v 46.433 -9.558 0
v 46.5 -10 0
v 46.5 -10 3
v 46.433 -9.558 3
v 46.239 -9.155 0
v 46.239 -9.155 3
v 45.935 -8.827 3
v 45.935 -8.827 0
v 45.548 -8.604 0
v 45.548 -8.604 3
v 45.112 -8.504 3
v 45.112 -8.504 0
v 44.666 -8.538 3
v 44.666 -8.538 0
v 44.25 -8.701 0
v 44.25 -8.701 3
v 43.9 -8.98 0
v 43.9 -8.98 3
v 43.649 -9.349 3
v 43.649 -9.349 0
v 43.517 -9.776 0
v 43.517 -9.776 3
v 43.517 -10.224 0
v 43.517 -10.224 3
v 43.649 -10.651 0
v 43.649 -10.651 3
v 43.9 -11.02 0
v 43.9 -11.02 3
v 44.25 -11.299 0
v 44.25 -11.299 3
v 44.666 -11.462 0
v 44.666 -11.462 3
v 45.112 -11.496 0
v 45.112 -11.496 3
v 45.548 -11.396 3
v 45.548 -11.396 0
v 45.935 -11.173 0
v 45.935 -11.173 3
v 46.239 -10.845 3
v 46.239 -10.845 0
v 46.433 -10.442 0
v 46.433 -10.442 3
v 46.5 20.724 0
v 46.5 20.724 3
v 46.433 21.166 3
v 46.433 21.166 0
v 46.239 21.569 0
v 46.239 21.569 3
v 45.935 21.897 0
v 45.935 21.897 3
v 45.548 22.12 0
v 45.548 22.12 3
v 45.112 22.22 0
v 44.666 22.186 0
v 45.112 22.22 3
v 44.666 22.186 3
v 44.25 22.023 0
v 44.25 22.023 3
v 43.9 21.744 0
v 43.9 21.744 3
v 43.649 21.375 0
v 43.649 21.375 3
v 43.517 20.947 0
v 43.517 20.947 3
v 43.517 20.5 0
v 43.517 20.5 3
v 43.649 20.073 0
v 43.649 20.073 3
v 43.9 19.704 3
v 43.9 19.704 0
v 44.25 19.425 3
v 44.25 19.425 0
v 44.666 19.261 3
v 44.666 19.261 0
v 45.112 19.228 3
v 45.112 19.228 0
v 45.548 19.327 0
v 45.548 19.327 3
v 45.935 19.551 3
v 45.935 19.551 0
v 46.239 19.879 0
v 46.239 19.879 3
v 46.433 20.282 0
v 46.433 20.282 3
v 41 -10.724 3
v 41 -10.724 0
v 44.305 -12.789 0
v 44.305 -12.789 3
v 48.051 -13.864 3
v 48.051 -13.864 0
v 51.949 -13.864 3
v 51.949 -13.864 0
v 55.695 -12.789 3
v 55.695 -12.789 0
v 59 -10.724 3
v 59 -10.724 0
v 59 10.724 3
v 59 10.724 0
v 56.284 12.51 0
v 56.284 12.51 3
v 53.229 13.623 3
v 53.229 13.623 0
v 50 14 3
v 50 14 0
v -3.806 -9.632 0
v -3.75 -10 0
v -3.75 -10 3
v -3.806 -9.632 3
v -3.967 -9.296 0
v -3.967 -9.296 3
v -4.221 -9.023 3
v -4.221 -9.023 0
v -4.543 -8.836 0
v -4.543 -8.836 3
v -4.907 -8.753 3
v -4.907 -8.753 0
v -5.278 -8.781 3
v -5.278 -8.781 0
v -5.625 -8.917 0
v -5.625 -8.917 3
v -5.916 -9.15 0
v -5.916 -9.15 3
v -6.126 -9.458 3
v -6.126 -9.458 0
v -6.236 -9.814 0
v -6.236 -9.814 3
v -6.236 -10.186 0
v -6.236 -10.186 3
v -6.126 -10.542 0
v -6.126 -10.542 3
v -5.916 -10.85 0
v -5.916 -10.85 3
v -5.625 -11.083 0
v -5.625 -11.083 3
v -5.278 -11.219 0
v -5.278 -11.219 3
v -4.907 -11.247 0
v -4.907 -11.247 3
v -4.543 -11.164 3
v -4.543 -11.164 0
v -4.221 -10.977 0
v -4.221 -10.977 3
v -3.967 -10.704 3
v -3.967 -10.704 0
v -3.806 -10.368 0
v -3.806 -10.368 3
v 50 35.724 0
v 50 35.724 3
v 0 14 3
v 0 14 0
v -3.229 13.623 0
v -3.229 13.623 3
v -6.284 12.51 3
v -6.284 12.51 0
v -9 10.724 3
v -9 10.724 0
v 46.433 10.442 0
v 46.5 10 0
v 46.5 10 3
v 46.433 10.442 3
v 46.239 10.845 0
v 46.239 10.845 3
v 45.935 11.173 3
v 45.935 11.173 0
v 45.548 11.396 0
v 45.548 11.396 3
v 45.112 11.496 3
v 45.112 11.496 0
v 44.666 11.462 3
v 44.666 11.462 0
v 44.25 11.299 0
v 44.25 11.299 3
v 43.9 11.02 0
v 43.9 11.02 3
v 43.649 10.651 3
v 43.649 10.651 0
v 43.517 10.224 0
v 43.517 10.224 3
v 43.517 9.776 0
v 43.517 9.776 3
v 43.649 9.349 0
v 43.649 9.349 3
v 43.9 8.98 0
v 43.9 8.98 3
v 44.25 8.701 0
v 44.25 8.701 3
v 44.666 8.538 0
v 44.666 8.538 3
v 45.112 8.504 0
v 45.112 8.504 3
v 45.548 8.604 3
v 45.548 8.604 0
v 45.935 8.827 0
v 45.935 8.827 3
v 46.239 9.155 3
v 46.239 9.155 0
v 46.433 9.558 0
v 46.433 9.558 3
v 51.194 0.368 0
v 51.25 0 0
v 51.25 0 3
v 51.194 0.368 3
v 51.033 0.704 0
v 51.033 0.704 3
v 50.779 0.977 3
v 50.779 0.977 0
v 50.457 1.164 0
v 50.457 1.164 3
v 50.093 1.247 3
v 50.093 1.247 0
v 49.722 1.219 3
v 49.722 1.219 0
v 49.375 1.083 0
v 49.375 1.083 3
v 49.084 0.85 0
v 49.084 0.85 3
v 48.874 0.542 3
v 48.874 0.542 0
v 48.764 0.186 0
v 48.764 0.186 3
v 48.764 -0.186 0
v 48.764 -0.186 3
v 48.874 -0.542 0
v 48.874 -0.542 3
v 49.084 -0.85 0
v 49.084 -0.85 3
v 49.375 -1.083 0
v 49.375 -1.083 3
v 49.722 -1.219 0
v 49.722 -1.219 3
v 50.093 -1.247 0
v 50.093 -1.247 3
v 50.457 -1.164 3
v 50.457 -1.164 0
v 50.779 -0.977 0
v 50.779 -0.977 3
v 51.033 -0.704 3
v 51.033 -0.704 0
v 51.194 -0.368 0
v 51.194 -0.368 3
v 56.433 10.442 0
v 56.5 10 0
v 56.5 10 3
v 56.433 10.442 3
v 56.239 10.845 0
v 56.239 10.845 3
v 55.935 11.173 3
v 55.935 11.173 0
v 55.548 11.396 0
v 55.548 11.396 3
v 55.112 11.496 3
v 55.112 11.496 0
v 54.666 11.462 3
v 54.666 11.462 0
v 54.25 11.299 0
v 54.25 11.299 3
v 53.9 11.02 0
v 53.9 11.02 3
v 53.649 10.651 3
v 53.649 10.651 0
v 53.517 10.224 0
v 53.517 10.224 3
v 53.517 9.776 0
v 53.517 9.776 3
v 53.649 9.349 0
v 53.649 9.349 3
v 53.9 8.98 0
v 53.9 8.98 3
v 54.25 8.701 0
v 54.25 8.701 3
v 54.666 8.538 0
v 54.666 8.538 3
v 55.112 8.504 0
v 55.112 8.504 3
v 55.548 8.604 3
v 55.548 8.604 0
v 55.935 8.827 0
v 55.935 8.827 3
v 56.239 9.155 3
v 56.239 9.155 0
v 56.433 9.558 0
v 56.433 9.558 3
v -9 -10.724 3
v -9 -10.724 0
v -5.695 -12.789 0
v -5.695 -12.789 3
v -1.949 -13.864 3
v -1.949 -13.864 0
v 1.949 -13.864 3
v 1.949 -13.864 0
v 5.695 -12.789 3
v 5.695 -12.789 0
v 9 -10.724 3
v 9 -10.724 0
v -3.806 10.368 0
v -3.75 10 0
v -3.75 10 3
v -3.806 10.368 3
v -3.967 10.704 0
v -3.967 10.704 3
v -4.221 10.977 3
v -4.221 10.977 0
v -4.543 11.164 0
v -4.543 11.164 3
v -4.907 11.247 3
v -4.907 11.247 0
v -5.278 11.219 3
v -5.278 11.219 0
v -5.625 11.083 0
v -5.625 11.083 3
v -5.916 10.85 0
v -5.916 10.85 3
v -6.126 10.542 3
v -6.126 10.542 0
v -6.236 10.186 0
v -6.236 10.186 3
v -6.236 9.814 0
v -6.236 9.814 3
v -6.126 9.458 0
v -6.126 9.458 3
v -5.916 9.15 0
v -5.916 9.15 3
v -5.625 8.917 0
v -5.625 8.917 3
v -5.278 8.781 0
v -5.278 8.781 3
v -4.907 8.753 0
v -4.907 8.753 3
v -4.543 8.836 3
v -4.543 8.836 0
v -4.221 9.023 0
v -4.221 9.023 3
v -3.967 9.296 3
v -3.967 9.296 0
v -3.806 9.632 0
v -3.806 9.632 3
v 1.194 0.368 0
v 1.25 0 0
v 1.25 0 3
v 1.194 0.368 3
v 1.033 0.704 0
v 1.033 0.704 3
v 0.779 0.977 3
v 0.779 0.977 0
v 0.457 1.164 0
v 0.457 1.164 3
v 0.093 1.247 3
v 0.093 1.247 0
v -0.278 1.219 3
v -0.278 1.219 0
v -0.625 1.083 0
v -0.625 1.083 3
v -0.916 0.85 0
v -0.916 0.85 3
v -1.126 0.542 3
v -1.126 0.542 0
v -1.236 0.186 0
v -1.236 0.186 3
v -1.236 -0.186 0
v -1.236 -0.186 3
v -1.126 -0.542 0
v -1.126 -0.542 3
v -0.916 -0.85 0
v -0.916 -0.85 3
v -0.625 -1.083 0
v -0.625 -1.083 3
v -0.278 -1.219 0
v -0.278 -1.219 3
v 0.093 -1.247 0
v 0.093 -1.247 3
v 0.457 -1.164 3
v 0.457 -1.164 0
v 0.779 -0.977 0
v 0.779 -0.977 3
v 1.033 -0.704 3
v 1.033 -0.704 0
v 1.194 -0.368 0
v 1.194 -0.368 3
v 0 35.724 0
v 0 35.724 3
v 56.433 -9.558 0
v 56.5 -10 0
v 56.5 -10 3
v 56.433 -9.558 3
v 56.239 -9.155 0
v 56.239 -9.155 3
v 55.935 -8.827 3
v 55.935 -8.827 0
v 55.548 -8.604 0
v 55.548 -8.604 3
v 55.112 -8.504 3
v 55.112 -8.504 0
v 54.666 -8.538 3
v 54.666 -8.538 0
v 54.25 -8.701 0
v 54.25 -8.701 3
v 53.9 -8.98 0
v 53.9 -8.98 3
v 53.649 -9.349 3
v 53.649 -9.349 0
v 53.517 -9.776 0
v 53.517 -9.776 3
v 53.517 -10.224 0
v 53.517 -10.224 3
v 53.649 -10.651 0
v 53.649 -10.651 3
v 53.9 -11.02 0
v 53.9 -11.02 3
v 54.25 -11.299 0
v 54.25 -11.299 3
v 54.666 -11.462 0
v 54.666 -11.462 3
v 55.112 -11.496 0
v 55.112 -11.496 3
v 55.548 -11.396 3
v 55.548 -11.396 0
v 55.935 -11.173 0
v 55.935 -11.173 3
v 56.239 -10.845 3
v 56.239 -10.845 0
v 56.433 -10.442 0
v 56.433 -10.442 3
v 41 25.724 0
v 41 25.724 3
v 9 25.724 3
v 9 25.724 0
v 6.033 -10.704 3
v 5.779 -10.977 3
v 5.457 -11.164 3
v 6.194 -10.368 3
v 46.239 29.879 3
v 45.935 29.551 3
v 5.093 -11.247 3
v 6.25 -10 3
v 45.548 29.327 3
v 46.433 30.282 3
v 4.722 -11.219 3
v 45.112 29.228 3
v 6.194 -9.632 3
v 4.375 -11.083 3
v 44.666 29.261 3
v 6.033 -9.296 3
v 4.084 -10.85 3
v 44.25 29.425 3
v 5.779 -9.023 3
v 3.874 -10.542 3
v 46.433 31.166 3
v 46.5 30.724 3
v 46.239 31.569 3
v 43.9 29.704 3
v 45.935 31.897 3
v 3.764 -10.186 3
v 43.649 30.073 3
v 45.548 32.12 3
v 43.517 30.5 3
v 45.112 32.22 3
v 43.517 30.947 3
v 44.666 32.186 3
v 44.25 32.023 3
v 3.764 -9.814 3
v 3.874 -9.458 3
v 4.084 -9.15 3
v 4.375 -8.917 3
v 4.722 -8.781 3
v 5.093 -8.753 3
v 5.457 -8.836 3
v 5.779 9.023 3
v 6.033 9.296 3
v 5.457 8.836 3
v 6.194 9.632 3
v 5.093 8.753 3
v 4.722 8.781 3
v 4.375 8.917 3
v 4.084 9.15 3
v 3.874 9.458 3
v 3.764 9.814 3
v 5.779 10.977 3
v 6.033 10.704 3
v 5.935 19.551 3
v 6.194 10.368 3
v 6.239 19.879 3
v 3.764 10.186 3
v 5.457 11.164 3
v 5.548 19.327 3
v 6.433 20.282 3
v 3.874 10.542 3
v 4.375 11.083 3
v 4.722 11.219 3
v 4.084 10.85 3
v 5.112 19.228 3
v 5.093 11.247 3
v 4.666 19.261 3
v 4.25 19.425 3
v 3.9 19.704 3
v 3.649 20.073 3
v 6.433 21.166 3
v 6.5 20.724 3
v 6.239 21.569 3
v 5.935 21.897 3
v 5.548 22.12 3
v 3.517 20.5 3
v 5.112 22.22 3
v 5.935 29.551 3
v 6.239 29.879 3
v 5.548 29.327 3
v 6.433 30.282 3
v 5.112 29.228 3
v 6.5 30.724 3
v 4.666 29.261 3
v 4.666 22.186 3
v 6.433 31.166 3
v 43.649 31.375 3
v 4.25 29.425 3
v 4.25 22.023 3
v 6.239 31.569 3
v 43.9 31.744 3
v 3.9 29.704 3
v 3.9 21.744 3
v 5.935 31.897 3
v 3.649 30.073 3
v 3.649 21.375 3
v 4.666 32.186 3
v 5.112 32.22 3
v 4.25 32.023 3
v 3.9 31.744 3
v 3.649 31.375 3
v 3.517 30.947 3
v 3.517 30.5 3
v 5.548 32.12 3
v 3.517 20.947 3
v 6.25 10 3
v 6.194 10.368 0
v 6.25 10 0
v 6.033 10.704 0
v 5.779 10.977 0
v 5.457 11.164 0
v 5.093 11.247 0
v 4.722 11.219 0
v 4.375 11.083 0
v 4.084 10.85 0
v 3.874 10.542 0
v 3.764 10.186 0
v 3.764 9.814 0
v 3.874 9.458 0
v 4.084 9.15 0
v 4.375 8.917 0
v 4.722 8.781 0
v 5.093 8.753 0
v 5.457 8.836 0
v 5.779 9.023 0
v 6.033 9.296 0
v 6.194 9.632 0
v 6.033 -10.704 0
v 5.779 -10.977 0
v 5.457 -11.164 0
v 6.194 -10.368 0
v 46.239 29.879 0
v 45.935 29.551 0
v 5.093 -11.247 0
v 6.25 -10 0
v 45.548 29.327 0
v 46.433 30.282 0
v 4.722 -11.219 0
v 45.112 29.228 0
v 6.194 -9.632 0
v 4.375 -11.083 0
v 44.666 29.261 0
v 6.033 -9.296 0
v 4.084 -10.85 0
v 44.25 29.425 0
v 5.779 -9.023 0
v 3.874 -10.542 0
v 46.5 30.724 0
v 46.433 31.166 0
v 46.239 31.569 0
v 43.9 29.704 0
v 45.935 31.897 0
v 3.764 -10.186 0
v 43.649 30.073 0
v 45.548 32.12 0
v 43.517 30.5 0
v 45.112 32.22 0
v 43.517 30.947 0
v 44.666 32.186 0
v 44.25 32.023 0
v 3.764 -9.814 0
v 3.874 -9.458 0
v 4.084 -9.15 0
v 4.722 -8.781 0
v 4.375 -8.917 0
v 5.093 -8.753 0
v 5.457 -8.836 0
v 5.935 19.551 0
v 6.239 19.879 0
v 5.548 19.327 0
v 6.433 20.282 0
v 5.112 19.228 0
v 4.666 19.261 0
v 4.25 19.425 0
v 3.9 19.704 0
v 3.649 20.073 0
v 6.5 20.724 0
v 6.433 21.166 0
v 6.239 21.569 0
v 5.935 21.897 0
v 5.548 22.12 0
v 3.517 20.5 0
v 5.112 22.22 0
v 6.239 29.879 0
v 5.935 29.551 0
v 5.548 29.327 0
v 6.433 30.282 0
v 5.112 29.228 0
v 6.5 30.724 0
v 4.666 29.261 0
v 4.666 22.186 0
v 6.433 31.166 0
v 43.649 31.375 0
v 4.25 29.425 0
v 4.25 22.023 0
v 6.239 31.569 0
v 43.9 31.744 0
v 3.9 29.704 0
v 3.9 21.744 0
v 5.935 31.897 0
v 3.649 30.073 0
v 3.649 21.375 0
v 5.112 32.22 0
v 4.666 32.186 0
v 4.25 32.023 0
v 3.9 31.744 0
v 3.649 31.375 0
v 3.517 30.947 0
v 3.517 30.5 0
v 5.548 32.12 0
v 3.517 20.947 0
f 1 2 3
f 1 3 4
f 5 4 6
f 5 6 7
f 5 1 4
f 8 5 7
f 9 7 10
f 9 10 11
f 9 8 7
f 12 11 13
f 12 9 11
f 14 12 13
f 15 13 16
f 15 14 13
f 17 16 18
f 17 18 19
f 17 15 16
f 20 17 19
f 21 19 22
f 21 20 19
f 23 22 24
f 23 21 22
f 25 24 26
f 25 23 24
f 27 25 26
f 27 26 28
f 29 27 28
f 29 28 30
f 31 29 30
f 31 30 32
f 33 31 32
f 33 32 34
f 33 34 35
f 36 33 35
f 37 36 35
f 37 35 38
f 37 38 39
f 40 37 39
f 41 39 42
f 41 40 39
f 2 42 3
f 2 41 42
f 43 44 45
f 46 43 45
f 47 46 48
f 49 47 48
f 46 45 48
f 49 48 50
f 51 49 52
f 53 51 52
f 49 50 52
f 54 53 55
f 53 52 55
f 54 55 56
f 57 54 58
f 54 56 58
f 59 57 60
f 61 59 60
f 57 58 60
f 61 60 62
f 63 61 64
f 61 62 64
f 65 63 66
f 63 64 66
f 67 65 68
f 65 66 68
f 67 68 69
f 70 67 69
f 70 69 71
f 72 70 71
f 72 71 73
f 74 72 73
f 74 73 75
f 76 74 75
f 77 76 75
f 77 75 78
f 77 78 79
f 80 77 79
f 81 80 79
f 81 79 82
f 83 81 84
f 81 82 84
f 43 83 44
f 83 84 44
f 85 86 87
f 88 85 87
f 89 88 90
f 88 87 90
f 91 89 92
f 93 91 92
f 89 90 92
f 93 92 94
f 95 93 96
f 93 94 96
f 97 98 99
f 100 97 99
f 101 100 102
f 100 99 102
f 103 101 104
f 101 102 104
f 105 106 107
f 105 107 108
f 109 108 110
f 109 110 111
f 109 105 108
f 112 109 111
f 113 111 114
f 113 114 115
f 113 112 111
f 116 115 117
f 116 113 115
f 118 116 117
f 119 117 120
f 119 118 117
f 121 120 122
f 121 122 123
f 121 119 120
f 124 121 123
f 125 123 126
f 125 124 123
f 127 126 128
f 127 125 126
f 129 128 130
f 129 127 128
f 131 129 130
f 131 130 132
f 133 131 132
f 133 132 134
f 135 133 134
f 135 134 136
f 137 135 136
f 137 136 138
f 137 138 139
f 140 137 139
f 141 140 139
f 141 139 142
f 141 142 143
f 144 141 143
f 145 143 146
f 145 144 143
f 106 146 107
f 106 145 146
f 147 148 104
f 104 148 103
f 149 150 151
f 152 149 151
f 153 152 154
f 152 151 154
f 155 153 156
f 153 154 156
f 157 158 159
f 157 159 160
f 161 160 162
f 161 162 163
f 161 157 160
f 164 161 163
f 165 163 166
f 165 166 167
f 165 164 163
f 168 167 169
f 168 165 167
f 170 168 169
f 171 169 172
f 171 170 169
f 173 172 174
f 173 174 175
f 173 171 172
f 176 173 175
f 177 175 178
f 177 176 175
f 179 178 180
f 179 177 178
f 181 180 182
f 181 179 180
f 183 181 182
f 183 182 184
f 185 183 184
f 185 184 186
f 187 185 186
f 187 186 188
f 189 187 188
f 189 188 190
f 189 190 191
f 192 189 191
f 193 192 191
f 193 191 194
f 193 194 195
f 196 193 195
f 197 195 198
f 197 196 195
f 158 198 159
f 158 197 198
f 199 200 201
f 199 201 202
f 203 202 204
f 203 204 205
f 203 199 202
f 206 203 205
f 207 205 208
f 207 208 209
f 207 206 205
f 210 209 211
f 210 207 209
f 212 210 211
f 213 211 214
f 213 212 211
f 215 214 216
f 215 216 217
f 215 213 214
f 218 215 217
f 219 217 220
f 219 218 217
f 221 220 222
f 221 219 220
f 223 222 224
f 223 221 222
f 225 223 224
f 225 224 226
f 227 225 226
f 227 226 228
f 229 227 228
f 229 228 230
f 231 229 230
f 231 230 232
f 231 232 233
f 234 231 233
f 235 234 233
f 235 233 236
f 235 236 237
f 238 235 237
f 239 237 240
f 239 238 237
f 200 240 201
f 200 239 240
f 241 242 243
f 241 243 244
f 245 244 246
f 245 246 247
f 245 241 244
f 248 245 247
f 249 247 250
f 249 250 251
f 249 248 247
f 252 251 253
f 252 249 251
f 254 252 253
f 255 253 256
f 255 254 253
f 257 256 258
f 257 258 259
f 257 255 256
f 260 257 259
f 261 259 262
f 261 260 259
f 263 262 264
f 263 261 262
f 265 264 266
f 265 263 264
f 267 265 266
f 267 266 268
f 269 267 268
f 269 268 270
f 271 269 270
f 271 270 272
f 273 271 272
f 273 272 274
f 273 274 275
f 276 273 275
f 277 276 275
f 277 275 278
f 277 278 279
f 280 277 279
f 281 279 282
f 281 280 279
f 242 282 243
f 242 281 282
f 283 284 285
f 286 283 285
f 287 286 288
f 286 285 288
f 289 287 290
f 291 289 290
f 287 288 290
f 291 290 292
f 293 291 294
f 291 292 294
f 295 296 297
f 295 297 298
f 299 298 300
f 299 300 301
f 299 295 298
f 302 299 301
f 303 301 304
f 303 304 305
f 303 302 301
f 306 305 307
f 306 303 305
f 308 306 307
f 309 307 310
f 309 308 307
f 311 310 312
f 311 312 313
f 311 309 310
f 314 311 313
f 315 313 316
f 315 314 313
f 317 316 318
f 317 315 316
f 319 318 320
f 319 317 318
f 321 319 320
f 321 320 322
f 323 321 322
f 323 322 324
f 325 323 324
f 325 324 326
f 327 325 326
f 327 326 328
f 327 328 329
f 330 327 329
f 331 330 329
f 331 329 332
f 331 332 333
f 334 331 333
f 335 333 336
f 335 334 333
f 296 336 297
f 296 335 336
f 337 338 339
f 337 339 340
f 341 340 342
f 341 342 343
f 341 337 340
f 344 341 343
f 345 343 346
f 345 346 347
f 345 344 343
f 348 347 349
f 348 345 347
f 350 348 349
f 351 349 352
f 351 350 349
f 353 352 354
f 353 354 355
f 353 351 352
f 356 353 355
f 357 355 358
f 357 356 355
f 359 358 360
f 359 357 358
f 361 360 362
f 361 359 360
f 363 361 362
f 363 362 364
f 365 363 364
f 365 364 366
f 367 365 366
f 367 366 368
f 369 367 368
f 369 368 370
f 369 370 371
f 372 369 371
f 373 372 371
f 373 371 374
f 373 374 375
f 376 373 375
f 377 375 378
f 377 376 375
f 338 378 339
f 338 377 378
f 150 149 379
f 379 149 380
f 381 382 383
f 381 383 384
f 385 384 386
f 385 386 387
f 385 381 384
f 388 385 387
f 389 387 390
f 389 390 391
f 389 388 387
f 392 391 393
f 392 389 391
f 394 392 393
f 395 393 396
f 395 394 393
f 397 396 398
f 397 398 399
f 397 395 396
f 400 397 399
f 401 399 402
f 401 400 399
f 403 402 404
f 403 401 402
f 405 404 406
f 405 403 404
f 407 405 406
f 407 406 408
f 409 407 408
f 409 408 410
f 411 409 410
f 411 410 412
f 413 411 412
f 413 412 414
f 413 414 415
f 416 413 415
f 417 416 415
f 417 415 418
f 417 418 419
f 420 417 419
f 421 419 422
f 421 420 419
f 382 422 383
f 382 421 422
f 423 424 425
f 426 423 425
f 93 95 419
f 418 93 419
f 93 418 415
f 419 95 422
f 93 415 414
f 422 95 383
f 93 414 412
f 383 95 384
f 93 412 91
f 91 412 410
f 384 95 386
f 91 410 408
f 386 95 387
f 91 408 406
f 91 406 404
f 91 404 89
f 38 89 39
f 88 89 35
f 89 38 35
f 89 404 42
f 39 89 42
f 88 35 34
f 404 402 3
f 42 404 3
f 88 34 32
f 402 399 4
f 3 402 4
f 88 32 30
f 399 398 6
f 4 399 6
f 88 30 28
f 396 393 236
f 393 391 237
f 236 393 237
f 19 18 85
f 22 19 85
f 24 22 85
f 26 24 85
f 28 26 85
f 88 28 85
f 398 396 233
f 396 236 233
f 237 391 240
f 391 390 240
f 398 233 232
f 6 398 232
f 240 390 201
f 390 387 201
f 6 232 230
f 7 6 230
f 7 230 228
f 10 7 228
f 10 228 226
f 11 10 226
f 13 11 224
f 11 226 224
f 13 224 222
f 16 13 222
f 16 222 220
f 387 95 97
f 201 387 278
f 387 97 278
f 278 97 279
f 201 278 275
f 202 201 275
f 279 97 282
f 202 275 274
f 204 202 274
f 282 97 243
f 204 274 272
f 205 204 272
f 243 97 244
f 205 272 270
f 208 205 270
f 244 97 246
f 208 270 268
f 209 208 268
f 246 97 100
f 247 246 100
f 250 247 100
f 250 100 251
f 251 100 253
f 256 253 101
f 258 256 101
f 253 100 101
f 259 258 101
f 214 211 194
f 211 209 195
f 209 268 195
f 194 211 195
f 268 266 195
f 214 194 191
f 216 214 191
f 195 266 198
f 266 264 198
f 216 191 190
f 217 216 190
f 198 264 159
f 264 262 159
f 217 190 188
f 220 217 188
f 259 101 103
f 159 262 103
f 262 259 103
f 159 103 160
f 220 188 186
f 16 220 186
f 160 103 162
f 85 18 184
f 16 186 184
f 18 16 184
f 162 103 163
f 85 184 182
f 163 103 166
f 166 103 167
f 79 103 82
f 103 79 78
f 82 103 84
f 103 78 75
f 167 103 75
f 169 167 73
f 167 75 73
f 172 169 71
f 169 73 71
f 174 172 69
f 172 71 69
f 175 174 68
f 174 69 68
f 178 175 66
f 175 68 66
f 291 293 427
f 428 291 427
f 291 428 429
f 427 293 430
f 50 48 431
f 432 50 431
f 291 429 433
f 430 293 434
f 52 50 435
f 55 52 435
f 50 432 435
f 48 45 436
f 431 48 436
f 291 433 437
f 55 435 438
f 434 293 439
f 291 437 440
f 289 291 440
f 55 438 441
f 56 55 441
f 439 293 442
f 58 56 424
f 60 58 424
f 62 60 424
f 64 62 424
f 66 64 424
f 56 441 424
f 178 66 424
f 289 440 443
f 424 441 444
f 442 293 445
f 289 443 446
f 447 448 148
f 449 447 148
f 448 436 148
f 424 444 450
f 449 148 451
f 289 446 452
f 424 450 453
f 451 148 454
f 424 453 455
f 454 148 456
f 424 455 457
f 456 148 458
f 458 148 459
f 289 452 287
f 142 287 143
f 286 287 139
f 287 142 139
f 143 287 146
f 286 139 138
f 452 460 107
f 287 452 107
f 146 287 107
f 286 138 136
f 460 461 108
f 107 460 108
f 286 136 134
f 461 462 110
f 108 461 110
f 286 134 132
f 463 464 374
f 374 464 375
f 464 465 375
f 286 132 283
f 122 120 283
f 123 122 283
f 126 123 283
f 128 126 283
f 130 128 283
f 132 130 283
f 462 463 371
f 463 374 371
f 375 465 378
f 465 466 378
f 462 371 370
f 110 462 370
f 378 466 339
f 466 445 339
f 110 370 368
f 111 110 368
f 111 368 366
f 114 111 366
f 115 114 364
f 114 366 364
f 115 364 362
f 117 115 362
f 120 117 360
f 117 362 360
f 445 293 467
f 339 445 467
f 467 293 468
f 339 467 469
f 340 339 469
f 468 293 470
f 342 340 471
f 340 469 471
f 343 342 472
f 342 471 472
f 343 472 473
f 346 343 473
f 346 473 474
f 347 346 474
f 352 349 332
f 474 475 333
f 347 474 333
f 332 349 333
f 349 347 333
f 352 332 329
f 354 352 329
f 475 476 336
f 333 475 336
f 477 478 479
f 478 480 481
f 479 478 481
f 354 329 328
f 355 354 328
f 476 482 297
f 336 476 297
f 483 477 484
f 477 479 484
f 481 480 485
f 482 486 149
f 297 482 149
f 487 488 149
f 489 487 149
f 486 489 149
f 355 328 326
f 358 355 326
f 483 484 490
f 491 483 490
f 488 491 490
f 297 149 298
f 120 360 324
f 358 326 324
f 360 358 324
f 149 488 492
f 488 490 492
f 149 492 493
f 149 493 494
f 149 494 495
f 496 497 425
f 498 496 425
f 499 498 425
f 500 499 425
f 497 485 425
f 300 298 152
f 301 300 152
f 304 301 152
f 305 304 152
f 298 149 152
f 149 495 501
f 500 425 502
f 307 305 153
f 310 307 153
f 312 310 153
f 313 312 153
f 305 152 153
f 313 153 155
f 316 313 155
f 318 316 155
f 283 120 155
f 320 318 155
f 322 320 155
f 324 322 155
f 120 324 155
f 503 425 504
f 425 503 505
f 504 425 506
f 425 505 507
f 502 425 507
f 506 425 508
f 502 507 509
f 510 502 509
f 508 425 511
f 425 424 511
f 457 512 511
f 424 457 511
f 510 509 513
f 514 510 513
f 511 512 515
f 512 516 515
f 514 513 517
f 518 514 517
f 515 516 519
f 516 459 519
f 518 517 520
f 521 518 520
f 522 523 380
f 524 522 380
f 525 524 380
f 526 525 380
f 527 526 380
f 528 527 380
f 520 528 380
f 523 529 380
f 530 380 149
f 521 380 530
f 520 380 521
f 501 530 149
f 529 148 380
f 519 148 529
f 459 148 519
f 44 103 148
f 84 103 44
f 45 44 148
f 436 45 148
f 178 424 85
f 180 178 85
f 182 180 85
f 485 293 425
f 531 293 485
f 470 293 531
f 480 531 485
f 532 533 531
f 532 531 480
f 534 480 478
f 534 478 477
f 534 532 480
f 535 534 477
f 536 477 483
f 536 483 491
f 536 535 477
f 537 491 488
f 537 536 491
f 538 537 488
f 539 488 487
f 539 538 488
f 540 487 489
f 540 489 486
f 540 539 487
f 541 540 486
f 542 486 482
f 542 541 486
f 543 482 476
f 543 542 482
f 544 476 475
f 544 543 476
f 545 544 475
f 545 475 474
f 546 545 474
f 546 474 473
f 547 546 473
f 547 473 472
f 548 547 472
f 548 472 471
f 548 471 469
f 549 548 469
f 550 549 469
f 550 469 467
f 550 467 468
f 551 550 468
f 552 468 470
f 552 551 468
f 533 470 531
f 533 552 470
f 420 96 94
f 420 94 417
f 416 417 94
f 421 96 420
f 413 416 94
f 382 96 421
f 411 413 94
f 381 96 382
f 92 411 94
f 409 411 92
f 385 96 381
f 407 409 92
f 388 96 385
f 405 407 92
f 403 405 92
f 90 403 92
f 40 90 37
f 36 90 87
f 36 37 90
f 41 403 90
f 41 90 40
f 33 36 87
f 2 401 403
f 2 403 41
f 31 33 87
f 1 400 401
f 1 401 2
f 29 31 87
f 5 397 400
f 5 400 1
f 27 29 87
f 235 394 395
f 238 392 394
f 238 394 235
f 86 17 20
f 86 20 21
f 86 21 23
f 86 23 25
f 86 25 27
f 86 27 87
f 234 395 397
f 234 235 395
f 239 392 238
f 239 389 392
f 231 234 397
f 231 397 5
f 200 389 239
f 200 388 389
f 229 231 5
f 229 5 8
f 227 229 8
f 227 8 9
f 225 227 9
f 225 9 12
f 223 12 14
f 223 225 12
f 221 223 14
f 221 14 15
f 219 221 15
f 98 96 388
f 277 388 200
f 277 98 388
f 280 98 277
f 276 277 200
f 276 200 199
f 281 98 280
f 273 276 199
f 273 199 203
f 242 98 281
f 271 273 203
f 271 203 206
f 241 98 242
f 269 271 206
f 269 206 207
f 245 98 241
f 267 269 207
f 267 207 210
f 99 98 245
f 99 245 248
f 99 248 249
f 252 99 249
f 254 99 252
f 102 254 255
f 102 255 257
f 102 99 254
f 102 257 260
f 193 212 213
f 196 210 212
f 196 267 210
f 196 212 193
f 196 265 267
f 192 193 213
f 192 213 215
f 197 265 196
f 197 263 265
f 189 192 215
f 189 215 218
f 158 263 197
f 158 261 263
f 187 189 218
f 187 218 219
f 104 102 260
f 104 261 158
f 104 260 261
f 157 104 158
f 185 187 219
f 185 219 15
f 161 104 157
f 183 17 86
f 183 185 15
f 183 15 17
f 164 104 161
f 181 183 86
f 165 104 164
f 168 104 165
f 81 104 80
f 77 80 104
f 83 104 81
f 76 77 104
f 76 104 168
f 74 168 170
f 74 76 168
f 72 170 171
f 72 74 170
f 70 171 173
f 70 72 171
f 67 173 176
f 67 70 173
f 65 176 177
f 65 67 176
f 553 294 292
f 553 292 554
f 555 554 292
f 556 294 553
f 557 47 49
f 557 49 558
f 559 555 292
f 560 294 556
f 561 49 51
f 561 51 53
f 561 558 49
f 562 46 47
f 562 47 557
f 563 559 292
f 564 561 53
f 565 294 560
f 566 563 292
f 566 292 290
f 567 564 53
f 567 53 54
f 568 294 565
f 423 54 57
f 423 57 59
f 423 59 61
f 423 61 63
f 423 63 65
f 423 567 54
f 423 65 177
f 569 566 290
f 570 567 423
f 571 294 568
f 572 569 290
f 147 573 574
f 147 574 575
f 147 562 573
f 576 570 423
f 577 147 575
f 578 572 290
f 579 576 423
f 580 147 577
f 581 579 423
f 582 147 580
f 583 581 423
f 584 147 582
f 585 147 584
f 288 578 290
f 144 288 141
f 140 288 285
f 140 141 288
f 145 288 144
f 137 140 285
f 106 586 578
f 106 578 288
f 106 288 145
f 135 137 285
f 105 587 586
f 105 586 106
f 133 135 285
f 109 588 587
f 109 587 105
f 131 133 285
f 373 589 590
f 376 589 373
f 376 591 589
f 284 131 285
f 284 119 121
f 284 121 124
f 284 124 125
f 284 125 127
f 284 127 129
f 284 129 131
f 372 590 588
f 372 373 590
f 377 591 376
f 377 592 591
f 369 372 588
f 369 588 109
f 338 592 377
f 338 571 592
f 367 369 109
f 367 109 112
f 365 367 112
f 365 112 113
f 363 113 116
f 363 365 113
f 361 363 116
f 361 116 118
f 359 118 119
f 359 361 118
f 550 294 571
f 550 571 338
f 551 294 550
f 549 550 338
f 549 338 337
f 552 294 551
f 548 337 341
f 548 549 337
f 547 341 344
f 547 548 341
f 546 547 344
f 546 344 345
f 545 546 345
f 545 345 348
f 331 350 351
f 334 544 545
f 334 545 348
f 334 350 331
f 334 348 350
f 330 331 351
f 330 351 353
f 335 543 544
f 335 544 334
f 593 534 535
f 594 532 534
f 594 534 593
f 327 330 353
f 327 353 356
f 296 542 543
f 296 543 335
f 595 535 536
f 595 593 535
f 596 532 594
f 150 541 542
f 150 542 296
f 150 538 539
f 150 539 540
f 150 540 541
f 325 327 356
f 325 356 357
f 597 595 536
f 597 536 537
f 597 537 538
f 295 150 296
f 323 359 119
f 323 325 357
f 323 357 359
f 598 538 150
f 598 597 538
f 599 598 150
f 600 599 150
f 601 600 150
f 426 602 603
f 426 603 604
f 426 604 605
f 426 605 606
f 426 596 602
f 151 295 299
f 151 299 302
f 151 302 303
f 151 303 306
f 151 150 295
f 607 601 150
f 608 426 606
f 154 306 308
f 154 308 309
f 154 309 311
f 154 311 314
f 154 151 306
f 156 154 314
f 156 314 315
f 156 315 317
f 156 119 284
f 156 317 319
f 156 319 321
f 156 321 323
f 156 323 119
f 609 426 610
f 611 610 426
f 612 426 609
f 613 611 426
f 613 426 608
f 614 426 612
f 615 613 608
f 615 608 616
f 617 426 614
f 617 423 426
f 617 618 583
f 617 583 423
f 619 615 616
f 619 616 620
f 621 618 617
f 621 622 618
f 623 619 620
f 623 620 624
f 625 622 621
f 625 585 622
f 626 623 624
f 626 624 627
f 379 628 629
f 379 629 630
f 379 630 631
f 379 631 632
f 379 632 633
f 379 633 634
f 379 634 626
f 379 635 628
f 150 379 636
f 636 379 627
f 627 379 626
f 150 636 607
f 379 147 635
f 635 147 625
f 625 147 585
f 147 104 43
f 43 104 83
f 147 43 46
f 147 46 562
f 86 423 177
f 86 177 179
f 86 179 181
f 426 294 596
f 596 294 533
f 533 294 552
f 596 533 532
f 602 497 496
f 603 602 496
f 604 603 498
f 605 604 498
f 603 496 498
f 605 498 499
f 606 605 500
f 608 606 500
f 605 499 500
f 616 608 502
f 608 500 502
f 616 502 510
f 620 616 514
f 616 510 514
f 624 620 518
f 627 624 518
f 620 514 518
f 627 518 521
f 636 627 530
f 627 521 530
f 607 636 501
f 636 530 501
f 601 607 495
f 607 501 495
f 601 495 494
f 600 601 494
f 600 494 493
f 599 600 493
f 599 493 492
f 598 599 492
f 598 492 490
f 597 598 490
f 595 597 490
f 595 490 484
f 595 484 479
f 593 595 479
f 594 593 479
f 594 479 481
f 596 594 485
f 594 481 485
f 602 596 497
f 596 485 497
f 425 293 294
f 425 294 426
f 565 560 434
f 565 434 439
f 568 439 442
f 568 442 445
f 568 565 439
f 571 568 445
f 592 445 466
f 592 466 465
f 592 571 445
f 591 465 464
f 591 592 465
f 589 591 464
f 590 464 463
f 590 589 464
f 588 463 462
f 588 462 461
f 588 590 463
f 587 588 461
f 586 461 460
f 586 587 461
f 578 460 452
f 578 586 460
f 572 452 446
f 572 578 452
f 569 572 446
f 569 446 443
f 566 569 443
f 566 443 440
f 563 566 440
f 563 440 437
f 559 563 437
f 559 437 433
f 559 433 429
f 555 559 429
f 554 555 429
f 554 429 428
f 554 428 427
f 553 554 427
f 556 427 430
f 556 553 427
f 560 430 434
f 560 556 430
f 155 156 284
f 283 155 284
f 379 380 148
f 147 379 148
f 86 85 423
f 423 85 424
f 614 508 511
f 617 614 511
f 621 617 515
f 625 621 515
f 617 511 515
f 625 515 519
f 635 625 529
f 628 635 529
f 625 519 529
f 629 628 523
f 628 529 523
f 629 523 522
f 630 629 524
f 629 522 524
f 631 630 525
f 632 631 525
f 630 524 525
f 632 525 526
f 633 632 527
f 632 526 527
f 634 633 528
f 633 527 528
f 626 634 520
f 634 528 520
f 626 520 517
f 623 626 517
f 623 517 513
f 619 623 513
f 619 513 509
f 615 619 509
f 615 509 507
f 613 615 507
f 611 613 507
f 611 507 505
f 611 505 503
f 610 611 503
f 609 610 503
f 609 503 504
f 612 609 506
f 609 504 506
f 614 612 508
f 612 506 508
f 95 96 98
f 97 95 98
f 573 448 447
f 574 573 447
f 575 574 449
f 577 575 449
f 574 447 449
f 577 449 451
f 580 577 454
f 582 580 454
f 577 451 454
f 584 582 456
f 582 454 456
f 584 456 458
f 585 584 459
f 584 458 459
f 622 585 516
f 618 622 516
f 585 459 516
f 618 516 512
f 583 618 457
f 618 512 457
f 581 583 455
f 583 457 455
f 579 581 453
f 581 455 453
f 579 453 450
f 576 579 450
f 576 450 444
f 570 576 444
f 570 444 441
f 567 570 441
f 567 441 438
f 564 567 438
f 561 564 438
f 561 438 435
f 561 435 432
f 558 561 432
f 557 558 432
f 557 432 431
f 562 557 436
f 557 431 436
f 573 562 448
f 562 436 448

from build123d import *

# Parameters (mm, degrees)
SKETCH1_R           = 1.25
SKETCH1_R_2         = 1.5
BOSS_EXTRUDE1_DEPTH = 3
SKETCH2_R           = 1.5
BOSS_EXTRUDE2_DEPTH = 3
SKETCH3_W           = 32
SKETCH3_H           = 21.44761059
CUT_EXTRUDE1_DEPTH  = 4


with BuildPart() as part:
    # Sketch1 → Boss-Extrude1 (new body)
    with BuildSketch(Plane.XY):
        with BuildLine():
            Line((-9, 10.723805295), (-9, -10.723805295))
            ThreePointArc((-9, -10.723805295), (0, -14), (9, -10.723805295))
            Line((9, -10.723805295), (41, -10.723805295))
            ThreePointArc((41, -10.723805295), (50, -14), (59, -10.723805295))
            Line((59, -10.723805295), (59, 10.723805295))
            ThreePointArc((59, 10.723805295), (50, 14), (41, 10.723805295))
            Line((41, 10.723805295), (9, 10.723805295))
            ThreePointArc((9, 10.723805295), (0, 14), (-9, 10.723805295))
        make_face()
        Circle(SKETCH1_R, mode=Mode.SUBTRACT)
        with Locations((-5, 10)):
            Circle(SKETCH1_R, mode=Mode.SUBTRACT)
        with Locations((5, 10)):
            Circle(SKETCH1_R, mode=Mode.SUBTRACT)
        with Locations((-5, -10)):
            Circle(SKETCH1_R, mode=Mode.SUBTRACT)
        with Locations((5, -10)):
            Circle(SKETCH1_R, mode=Mode.SUBTRACT)
        with Locations((50, 0)):
            Circle(SKETCH1_R, mode=Mode.SUBTRACT)
        with Locations((45, 10)):
            Circle(SKETCH1_R_2, mode=Mode.SUBTRACT)
        with Locations((55, 10)):
            Circle(SKETCH1_R_2, mode=Mode.SUBTRACT)
        with Locations((45, -10)):
            Circle(SKETCH1_R_2, mode=Mode.SUBTRACT)
        with Locations((55, -10)):
            Circle(SKETCH1_R_2, mode=Mode.SUBTRACT)
        with Locations((25, 0)):
            Circle(SKETCH1_R, mode=Mode.SUBTRACT)
        with Locations((25, 5)):
            Circle(SKETCH1_R, mode=Mode.SUBTRACT)
        with Locations((25, -5)):
            Circle(SKETCH1_R, mode=Mode.SUBTRACT)
        with Locations((35, 0)):
            Circle(SKETCH1_R, mode=Mode.SUBTRACT)
        with Locations((15, 0)):
            Circle(SKETCH1_R, mode=Mode.SUBTRACT)
        with Locations((35, 5)):
            Circle(SKETCH1_R, mode=Mode.SUBTRACT)
        with Locations((35, -5)):
            Circle(SKETCH1_R, mode=Mode.SUBTRACT)
        with Locations((15, -5)):
            Circle(SKETCH1_R, mode=Mode.SUBTRACT)
        with Locations((15, 5)):
            Circle(SKETCH1_R, mode=Mode.SUBTRACT)
    extrude(amount=BOSS_EXTRUDE1_DEPTH)

    # Sketch2 → Boss-Extrude2 (add)
    with BuildSketch(Plane.XY.offset(3)):
        with BuildLine():
            Line((0, 14), (0, 35.723805295))
            Line((0, 35.723805295), (50, 35.723805295))
            Line((50, 35.723805295), (50, 14))
            ThreePointArc((50, 14), (45.21112091, 13.155479355), (41, 10.723805295))
            Line((41, 10.723805295), (41, 25.723805295))
            Line((41, 25.723805295), (9, 25.723805295))
            Line((9, 25.723805295), (9, 10.723805295))
            ThreePointArc((9, 10.723805295), (4.78887909, 13.155479355), (0, 14))
        make_face()
        with Locations((5, 30.723805295)):
            Circle(SKETCH2_R, mode=Mode.SUBTRACT)
        with Locations((45, 30.723805295)):
            Circle(SKETCH2_R, mode=Mode.SUBTRACT)
        with Locations((45, 20.723805295)):
            Circle(SKETCH2_R, mode=Mode.SUBTRACT)
        with Locations((5, 20.723805295)):
            Circle(SKETCH2_R, mode=Mode.SUBTRACT)
    extrude(amount=-BOSS_EXTRUDE2_DEPTH)

    # Sketch3 → Cut-Extrude1 (cut, through all)
    with BuildSketch(Plane.XY.offset(3)):
        with Locations((25, 0)):
            Rectangle(SKETCH3_W, SKETCH3_H)
    extrude(amount=-CUT_EXTRUDE1_DEPTH, mode=Mode.SUBTRACT)


solid = part.part
